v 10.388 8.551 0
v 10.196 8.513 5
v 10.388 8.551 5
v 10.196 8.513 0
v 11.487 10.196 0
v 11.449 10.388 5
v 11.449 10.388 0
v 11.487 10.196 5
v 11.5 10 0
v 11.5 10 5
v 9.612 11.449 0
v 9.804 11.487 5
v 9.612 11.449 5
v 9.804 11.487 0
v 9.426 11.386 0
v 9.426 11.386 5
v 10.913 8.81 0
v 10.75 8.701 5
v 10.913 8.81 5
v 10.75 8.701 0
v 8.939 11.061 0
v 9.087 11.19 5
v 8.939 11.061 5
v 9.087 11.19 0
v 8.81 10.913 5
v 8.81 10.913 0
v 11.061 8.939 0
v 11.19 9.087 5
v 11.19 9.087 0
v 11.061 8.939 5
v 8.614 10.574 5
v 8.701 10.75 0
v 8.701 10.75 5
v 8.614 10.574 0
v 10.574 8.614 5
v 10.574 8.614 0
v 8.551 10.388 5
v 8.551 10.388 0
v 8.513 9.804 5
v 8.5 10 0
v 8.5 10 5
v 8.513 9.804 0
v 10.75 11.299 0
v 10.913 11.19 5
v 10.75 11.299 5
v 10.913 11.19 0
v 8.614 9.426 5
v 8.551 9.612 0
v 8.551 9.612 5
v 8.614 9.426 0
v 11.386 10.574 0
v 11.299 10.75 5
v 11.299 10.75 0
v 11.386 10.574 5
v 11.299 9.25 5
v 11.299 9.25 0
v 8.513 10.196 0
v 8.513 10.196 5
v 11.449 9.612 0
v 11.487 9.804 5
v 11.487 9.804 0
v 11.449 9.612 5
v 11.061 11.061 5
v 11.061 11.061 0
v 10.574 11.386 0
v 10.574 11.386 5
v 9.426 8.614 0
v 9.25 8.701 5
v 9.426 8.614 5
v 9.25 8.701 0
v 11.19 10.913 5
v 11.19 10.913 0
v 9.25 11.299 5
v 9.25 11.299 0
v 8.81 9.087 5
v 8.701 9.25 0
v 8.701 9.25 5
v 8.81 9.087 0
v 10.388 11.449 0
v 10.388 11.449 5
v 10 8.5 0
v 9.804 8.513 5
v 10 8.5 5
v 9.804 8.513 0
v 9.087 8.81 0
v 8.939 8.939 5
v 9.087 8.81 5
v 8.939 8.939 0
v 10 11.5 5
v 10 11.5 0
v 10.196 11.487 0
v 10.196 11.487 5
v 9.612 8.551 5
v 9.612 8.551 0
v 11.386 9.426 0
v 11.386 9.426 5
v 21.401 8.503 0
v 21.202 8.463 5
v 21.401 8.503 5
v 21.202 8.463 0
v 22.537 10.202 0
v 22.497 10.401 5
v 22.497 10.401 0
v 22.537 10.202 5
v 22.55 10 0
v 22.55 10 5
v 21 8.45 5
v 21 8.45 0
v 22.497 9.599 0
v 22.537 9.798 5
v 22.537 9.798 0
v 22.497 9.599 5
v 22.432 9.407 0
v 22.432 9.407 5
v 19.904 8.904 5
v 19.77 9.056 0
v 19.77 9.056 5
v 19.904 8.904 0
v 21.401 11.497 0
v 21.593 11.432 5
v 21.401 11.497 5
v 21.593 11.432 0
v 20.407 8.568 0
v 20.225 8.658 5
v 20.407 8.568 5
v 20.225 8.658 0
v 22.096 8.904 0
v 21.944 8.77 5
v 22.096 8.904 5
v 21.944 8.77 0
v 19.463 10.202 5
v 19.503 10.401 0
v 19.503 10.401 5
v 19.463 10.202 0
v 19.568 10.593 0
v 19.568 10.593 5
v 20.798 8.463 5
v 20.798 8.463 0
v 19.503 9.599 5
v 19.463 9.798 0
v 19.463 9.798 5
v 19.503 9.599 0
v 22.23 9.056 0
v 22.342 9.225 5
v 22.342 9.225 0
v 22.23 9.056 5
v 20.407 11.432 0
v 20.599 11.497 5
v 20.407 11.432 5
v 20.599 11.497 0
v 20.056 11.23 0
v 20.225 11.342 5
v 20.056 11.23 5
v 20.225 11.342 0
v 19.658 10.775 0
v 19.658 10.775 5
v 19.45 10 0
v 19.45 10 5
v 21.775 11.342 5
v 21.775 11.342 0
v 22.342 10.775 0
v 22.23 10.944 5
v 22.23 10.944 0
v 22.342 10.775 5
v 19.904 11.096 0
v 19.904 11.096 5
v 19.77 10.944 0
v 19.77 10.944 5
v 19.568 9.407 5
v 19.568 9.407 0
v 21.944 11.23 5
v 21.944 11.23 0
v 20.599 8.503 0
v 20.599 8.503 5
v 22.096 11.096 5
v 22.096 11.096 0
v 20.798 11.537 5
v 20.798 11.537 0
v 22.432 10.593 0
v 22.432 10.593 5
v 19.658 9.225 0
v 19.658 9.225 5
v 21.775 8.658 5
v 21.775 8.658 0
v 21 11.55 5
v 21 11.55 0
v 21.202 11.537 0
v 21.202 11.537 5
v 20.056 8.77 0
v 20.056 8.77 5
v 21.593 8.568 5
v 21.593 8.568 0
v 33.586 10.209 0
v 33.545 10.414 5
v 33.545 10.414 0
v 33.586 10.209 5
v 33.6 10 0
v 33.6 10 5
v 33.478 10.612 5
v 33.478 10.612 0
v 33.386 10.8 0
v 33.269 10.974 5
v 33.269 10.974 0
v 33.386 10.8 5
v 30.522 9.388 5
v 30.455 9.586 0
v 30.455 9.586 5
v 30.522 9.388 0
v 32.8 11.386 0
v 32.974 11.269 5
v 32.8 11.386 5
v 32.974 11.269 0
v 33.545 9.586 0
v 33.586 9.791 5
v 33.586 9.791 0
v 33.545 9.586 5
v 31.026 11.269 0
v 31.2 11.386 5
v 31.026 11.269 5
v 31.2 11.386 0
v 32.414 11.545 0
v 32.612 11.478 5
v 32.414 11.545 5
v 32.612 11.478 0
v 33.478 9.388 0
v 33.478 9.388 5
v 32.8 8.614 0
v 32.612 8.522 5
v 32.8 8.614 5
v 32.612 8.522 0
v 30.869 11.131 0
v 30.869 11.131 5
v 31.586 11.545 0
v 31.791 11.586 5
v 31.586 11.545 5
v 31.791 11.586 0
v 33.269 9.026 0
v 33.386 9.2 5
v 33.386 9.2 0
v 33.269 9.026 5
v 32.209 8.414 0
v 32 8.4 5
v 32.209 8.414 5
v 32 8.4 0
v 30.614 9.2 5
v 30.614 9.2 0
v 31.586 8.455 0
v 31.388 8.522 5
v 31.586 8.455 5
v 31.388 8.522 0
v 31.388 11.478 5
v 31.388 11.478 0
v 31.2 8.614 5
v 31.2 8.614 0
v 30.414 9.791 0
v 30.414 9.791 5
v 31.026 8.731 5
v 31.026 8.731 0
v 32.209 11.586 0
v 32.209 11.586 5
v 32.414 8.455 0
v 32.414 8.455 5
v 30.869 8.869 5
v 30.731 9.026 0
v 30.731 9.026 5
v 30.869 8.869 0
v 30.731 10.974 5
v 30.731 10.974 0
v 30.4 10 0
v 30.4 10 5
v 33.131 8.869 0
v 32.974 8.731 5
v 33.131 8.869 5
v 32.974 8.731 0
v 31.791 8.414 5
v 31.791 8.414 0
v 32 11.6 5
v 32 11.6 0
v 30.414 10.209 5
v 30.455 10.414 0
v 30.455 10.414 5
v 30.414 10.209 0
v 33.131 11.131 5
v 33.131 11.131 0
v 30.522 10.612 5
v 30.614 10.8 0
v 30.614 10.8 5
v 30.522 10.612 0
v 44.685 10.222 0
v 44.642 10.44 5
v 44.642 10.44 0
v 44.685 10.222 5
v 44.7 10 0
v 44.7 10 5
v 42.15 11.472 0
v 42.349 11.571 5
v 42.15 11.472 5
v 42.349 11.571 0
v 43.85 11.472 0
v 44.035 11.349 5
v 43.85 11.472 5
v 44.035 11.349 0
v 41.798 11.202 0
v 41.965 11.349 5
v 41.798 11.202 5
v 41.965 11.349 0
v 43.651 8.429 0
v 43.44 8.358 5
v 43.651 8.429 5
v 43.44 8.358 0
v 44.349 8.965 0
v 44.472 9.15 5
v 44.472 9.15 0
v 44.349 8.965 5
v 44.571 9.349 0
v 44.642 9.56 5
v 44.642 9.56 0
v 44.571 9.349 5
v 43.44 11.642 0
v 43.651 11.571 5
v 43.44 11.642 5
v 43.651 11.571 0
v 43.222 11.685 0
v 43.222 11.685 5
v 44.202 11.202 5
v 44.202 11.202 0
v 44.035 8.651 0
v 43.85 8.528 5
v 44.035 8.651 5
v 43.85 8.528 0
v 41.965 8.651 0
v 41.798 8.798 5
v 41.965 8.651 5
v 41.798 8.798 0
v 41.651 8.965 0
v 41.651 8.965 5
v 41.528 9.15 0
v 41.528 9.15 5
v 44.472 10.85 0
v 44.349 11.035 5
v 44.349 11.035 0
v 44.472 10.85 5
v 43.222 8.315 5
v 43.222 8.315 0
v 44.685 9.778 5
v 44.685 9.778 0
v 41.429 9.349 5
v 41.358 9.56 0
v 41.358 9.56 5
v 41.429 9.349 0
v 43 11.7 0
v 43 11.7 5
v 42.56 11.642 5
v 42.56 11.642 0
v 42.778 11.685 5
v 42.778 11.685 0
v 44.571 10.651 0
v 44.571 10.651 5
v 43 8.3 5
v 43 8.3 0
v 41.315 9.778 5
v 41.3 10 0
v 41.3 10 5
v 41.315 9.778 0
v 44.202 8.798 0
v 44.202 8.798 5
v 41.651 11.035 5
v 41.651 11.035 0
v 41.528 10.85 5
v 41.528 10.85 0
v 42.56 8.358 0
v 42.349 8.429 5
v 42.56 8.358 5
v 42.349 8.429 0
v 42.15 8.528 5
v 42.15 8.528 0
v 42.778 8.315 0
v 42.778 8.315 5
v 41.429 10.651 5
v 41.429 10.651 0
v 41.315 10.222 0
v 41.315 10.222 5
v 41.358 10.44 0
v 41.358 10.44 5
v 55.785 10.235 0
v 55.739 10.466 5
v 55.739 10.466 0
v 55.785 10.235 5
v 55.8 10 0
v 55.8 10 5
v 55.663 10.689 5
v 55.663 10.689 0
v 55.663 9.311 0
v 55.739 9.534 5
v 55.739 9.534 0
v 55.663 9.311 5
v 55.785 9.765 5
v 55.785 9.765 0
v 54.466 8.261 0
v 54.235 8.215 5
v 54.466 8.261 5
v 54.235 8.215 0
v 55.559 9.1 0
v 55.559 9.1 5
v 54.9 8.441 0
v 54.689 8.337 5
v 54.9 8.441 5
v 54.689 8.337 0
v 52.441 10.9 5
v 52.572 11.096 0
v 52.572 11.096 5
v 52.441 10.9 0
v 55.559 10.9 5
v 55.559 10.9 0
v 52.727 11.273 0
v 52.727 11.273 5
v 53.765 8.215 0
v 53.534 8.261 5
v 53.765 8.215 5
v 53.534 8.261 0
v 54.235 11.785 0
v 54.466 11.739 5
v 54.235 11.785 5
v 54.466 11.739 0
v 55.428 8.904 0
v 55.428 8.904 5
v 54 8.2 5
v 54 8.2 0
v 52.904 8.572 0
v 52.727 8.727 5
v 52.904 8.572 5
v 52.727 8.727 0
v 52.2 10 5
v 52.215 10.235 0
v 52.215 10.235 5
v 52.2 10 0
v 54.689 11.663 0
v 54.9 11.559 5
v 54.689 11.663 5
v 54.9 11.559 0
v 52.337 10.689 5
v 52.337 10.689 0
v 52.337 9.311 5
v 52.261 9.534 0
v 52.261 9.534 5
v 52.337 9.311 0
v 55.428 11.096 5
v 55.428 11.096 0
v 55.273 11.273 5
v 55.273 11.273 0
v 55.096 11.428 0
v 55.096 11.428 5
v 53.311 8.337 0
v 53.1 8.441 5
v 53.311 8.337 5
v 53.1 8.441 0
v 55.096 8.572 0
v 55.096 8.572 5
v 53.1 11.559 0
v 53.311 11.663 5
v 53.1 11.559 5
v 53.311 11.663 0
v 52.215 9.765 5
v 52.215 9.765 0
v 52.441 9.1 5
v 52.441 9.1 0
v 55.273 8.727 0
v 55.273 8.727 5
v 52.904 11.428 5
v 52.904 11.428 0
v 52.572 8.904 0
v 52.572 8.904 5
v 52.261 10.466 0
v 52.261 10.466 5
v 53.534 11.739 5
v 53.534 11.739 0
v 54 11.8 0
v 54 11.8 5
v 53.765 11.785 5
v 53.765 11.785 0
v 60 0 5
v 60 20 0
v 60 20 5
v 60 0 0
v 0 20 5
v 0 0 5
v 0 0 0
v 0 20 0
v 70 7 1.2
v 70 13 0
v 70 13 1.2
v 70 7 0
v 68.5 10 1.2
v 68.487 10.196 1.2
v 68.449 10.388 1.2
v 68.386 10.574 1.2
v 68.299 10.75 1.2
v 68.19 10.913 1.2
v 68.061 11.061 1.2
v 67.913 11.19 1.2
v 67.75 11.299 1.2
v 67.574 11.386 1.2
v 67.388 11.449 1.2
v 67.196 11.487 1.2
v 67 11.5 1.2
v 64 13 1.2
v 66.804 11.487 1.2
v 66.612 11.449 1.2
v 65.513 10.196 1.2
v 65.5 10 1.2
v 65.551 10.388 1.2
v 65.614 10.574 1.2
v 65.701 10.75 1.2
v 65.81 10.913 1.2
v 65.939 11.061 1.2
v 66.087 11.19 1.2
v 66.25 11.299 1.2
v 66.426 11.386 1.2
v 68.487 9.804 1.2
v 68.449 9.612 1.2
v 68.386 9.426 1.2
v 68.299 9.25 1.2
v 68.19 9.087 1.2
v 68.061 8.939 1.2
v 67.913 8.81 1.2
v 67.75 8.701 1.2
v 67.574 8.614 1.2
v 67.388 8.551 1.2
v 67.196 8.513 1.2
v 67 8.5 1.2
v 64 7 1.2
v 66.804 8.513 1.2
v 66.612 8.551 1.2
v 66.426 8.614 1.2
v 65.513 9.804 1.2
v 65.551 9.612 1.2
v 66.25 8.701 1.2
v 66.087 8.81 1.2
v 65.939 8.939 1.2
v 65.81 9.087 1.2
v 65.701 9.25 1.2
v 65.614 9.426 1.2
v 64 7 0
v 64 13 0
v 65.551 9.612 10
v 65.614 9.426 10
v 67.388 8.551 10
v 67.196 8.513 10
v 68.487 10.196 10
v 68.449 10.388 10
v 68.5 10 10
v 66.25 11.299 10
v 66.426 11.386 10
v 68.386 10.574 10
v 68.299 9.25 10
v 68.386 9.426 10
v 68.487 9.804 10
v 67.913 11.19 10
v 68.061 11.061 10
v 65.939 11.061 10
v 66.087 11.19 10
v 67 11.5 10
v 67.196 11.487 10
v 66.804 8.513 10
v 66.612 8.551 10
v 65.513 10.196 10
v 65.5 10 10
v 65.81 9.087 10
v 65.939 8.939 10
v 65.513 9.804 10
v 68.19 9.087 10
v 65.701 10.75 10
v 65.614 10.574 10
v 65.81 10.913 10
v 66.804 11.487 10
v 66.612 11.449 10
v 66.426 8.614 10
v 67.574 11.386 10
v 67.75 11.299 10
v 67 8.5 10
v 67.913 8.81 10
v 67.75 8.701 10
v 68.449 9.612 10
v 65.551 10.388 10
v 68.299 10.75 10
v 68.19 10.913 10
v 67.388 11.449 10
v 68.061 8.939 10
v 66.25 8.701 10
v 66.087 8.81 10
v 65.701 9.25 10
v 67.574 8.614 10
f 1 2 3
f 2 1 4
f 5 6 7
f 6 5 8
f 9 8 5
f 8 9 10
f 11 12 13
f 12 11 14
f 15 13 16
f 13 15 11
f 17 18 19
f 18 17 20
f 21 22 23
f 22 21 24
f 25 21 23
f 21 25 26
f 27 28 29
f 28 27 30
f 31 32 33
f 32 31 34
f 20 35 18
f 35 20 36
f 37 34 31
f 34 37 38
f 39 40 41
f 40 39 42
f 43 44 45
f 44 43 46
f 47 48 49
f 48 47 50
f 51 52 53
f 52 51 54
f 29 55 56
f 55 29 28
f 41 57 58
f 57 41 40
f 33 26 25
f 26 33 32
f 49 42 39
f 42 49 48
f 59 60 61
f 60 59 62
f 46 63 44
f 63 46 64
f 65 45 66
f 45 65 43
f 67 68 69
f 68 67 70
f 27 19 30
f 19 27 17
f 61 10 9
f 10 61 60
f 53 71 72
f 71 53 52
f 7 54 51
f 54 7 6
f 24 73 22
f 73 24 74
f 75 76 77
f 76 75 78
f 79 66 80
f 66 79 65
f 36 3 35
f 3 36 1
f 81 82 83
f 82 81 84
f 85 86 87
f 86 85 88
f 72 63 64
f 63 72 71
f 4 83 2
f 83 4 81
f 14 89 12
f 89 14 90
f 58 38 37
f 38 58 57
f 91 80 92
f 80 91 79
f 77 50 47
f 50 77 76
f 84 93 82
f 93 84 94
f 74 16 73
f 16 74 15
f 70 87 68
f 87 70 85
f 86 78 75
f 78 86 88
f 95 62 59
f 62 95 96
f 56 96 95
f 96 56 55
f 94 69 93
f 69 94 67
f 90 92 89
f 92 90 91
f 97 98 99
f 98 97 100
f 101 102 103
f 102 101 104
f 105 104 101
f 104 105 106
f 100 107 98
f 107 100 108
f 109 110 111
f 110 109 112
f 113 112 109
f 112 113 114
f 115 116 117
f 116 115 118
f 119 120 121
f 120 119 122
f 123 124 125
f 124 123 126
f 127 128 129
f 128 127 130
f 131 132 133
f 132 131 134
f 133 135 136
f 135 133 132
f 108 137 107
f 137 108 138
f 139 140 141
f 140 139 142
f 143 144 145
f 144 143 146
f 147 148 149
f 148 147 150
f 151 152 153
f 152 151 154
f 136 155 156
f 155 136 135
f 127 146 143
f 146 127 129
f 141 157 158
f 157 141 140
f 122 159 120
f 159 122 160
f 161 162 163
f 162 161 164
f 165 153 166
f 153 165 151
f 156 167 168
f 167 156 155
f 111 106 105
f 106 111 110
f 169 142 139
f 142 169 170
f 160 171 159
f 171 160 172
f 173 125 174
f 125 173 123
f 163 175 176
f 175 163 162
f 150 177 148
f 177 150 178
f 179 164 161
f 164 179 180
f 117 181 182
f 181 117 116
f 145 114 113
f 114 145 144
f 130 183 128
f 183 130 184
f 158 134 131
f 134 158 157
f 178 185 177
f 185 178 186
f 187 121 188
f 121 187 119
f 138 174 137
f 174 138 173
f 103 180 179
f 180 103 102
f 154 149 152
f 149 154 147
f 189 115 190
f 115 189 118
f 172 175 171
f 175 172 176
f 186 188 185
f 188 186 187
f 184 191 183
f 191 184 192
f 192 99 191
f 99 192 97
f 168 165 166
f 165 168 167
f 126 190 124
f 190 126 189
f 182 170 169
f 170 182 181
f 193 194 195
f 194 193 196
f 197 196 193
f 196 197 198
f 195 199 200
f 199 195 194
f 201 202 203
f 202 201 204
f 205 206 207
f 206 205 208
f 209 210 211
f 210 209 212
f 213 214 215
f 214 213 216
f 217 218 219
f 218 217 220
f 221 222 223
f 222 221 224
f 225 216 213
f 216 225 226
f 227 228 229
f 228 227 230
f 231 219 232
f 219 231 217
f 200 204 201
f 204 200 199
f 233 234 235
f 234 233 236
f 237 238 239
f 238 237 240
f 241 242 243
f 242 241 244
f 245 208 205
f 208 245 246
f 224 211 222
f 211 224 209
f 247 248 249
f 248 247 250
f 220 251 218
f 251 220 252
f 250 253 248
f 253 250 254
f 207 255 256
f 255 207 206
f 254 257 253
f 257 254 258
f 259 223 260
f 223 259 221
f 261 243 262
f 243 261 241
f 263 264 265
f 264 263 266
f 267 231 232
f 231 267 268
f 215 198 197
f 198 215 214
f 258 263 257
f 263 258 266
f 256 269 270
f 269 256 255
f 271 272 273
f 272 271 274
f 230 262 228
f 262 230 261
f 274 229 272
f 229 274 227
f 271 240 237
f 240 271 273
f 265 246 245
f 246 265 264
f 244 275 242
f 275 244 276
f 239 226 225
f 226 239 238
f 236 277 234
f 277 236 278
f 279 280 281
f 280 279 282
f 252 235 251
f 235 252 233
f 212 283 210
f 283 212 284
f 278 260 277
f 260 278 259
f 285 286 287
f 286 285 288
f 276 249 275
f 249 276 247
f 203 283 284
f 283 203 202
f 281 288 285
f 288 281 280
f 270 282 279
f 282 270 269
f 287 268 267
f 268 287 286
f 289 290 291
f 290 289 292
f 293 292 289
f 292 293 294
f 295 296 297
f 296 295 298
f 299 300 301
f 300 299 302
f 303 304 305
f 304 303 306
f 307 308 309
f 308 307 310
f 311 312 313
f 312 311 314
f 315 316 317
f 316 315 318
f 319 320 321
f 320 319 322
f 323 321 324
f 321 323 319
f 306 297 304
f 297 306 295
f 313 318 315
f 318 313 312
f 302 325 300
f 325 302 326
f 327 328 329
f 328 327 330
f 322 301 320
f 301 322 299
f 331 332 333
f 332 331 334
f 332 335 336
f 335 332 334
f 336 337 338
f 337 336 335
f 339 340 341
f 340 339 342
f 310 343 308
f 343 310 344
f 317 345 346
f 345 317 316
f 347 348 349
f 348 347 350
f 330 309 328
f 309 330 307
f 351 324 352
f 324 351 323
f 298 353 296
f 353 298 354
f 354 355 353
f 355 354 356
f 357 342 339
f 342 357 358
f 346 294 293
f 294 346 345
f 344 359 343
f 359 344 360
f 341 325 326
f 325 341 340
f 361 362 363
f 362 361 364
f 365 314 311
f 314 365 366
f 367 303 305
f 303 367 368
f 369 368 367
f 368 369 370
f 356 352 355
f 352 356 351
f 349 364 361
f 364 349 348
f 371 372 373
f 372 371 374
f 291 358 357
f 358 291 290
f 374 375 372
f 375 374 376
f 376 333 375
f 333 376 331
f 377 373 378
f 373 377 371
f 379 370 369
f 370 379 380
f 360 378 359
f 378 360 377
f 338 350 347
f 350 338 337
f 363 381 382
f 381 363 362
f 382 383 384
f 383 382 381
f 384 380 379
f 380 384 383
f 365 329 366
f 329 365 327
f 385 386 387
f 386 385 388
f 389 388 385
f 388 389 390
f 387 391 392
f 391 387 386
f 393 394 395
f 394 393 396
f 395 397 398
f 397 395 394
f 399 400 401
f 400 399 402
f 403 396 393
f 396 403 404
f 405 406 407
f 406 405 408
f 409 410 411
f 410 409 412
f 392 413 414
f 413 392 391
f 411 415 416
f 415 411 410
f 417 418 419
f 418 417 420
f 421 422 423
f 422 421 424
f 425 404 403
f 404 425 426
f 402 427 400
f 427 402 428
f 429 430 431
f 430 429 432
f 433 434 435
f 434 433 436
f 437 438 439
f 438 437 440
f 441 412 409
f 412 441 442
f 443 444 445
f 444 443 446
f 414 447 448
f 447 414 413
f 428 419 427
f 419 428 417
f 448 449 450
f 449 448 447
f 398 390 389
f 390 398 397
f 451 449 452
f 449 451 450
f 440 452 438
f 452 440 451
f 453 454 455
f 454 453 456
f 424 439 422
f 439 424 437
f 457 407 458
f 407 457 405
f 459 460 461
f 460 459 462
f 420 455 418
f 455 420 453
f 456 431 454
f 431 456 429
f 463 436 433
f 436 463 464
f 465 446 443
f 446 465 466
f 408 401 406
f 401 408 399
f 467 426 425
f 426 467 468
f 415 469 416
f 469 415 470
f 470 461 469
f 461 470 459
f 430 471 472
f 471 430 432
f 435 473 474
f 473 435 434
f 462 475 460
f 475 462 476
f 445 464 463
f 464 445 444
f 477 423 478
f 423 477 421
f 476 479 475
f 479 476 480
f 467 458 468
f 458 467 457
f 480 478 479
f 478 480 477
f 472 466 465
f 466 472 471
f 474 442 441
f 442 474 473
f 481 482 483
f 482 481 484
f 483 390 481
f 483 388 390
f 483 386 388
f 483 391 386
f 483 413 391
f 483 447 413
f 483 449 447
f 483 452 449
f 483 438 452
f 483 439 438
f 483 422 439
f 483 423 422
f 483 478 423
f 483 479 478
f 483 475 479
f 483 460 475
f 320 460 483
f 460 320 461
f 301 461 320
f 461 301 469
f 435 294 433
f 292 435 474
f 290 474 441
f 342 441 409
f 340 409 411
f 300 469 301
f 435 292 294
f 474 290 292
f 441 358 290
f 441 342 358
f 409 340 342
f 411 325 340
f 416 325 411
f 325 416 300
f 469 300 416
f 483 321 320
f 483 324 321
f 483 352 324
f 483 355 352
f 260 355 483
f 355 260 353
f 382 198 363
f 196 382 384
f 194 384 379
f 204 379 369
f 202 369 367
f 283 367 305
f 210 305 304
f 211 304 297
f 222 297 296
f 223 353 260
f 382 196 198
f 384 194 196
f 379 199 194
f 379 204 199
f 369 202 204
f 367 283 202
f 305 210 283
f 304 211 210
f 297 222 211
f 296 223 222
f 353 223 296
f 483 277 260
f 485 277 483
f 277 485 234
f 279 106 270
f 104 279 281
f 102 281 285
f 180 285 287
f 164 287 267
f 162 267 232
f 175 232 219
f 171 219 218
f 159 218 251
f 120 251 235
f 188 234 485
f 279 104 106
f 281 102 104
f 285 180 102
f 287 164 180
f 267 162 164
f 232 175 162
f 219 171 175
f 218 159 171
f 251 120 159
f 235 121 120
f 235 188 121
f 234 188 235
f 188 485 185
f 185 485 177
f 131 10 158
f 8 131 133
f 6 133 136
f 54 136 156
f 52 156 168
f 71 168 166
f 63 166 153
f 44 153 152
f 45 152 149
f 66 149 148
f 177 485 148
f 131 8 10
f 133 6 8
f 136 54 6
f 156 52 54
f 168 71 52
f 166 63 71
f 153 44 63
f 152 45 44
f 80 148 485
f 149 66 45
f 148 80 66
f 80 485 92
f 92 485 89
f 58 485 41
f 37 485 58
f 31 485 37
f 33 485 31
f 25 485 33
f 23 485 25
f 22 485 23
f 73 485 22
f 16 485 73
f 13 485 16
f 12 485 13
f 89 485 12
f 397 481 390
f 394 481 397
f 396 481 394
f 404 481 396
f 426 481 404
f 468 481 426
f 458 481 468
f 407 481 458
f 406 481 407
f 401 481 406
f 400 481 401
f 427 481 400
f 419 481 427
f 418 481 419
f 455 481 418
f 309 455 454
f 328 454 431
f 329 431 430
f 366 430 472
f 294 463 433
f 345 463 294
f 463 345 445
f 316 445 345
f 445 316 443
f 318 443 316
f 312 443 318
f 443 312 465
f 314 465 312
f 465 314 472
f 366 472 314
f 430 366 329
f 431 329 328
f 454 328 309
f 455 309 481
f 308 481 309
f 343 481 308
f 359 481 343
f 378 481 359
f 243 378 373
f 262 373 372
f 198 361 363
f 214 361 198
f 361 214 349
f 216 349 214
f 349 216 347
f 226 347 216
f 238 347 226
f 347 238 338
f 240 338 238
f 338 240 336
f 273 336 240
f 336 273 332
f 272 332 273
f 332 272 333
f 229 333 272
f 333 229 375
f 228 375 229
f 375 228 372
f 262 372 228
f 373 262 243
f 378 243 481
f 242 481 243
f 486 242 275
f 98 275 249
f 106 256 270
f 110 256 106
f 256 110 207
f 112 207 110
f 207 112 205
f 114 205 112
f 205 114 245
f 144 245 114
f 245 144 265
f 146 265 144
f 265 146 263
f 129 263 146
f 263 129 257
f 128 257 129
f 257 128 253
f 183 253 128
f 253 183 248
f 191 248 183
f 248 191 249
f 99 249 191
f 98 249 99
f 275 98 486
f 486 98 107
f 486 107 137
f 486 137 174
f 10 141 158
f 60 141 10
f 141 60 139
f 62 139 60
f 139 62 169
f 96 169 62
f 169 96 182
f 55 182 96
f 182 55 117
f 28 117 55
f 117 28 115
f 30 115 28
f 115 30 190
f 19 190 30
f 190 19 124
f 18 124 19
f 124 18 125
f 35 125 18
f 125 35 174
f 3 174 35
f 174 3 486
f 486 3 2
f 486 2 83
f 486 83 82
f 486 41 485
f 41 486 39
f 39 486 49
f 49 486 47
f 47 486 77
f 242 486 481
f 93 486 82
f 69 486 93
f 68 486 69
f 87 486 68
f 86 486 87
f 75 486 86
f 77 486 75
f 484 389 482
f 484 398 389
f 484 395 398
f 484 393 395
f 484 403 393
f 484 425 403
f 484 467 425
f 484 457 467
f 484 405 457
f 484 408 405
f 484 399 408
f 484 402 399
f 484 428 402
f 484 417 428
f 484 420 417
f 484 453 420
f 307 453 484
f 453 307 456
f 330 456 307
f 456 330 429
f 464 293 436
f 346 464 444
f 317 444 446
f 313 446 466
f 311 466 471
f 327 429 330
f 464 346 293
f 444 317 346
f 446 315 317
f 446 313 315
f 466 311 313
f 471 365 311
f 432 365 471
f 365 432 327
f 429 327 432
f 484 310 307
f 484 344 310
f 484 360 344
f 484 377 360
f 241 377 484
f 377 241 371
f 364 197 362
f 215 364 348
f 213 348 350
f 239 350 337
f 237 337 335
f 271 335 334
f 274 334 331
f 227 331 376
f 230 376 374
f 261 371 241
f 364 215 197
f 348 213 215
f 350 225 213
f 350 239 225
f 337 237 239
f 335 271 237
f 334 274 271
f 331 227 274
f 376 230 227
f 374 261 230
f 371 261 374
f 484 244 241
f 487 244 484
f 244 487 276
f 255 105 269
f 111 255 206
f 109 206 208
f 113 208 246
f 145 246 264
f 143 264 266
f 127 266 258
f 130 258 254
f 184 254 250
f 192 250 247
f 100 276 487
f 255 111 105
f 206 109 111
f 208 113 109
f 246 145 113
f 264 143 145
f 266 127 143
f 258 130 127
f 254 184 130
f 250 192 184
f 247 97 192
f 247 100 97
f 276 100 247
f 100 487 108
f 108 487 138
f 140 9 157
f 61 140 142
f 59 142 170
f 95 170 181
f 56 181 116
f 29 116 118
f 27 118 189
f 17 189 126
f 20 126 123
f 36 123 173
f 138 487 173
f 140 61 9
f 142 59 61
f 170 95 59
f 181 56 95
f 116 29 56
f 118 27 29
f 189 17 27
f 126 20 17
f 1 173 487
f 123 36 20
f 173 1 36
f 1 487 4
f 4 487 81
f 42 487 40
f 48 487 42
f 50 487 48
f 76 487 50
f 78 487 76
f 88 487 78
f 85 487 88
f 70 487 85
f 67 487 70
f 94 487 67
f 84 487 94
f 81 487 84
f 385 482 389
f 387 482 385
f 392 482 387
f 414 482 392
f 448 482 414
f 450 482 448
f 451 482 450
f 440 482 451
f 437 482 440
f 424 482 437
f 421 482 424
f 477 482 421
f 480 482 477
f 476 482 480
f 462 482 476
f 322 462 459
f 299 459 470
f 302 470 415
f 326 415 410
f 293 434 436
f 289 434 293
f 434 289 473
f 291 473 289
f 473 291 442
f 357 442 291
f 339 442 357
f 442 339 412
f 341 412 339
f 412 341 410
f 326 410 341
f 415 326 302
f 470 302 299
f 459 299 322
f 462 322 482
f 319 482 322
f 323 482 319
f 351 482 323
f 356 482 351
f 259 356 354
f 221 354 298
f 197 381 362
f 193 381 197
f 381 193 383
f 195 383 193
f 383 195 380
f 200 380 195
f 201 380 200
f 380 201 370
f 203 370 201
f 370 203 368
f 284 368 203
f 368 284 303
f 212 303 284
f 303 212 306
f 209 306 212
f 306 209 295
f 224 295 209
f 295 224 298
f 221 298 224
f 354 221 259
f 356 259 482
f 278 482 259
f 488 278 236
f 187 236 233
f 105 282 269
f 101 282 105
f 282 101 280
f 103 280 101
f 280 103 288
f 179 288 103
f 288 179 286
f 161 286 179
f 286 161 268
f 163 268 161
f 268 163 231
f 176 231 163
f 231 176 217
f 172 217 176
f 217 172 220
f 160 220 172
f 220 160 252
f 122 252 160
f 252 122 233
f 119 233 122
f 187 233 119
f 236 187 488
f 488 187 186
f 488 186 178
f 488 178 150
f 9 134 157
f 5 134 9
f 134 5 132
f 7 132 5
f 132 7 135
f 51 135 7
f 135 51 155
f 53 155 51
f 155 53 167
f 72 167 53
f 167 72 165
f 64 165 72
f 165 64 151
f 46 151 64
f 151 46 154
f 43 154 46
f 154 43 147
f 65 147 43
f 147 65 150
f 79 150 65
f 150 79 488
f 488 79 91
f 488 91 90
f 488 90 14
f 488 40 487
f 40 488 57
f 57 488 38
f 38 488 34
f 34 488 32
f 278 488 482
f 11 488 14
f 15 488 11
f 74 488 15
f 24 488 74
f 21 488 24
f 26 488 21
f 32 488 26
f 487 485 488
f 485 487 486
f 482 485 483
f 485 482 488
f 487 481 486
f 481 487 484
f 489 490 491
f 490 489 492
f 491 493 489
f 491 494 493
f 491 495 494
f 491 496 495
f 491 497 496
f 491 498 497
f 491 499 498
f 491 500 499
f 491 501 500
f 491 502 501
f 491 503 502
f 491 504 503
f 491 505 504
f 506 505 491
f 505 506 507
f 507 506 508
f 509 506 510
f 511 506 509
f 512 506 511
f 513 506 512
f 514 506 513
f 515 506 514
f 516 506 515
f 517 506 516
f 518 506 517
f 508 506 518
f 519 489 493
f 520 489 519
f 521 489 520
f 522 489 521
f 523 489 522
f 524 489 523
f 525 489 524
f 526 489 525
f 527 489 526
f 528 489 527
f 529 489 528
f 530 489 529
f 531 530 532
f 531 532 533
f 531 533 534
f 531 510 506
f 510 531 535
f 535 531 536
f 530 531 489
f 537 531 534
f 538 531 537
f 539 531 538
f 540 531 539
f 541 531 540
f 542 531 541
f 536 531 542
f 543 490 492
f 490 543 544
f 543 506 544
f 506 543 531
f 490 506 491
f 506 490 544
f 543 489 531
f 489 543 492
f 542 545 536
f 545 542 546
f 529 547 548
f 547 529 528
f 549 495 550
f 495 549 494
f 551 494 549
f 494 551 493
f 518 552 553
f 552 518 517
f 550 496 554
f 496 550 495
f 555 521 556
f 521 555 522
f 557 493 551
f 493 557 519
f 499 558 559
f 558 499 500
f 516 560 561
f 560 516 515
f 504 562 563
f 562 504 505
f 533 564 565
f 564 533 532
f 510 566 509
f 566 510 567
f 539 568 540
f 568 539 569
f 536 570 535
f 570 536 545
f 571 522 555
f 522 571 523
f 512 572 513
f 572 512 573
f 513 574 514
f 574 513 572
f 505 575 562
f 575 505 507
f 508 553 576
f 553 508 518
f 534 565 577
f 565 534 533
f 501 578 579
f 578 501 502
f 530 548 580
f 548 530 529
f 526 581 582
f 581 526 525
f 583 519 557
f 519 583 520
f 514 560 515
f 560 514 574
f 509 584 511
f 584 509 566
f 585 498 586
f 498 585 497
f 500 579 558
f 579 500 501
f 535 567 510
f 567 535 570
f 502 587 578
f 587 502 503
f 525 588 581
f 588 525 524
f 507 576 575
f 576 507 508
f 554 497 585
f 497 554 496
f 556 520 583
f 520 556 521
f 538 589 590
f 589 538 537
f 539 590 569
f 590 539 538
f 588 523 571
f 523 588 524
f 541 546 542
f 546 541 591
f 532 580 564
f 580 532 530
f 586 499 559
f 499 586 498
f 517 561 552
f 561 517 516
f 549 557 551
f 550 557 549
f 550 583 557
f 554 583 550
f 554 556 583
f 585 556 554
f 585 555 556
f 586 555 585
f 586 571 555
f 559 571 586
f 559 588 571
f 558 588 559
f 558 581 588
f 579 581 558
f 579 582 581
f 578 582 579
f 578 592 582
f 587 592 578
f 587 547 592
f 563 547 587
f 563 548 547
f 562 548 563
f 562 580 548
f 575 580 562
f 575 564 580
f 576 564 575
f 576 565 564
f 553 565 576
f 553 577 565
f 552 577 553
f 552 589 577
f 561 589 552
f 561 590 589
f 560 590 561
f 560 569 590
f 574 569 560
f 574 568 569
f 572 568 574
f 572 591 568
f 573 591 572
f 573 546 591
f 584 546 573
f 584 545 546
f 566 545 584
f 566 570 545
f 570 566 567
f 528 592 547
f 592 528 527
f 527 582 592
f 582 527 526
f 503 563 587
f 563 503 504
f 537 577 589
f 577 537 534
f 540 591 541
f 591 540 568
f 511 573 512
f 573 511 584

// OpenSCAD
/*
	tolerance-gauge — 销孔配合 / 间隙补偿样件

	测什么
		一块 5 mm 厚板上开 5 个通孔，孔径 3.0 / 3.1 / 3.2 / 3.4 / 3.6 mm，
		旁边单独打一根 3.0 mm 的测试销。销能插进哪一档，就说明本机
		"孔的实际直径"比设计值小多少——也就是切片器/机器需要的间隙补偿量。

	怎么判读
		- 逐个试插：销能自由滑入、且不晃的最大孔径 = 你的"最小可用间隙"。
		- 3.0 孔能进：机器孔偏大或配合松（间隙补偿该往负调）。
		- 3.2 孔才进：孔实际缩小约 0.2 mm，属 FDM 常见量级（热收缩 + 圆弧内缩）。
		- 3.6 孔才进：偏大，查挤出过量、皮带松、或是孔内有毛刺。
		- 记住"设计孔径 → 实际可用孔径"的差值，建模时把孔直接画大同等量，
		  比在切片器里调 XY 补偿更可控（补偿会同时改外轮廓）。
		- 销本身也是直径检具：卡尺量销的实际直径，和 3.0 比对。

	期望值（默认参数）
		STL 体积 5.896 cm³，包围盒 70.00 × 20.00 × 10.00 mm，2 个独立实体
		（板 + 销），水密。孔壁是 $fn=48 的正圆，模型孔径就是设计值。

	参数
		hole_1..5   五个孔径 (mm)
		pin_d/pin_h 测试销直径 / 高度 (mm)
		plate_w/d/h 板的宽 / 深 / 厚 (mm)
		hole_x0     第一个孔的中心 X
		hole_pitch  孔间距 (X)
		pin_x       销的中心 X
*/

/* [孔径阶梯 (mm)] */
hole_1 = 3.0;     // 名义尺寸：能进说明配合偏松
hole_2 = 3.1;
hole_3 = 3.2;     // FDM 上最常见的"刚好能进"
hole_4 = 3.4;
hole_5 = 3.6;     // 最松

/* [测试销] */
pin_d = 3.0;      // 销直径 (mm)
pin_h = 10;       // 销高 (mm)

/* [基板] */
plate_w = 60;     // X
plate_d = 20;     // Y
plate_h = 5;      // Z（越厚孔越容易偏小）

/* [布局] */
hole_x0 = 10;     // 第一个孔中心 X
hole_pitch = 11;  // 孔间距 (X)
pin_x = 67;       // 销中心 X：放在板右侧，和板一起打

/* [网格] */
fn = 48;

holes = [hole_1, hole_2, hole_3, hole_4, hole_5];
n_holes = len(holes);

assert(min(holes) > 0 && pin_d > 0, "孔径 / 销径必须 > 0");
assert(hole_x0 + (n_holes - 1) * hole_pitch < plate_w, "孔位超出板宽：加大 plate_w 或减小 hole_pitch");
assert(pin_x - 3 > plate_w, "销和板会叠在一起：加大 pin_x");

module tolerance_plate() {
	difference() {
		cube([plate_w, plate_d, plate_h]);
		for (i = [0:n_holes - 1]) {
			// 上下各多切 1 mm，保证是通孔，且不会在板面留下零厚度的面
			translate([hole_x0 + i * hole_pitch, plate_d / 2, -1])
				cylinder(h = plate_h + 2, d = holes[i], $fn = fn);
		}
	}
}

module test_pin() {
	// 小垫片让 3 mm 细销能被热床抓住；销从 z=0 起，和垫片体积相交
	translate([pin_x - 3, plate_d / 2 - 3, 0]) cube([6, 6, 1.2]);
	translate([pin_x, plate_d / 2, 0]) cylinder(h = pin_h, d = pin_d, $fn = fn);
}

union() {
	tolerance_plate();
	test_pin();
}
